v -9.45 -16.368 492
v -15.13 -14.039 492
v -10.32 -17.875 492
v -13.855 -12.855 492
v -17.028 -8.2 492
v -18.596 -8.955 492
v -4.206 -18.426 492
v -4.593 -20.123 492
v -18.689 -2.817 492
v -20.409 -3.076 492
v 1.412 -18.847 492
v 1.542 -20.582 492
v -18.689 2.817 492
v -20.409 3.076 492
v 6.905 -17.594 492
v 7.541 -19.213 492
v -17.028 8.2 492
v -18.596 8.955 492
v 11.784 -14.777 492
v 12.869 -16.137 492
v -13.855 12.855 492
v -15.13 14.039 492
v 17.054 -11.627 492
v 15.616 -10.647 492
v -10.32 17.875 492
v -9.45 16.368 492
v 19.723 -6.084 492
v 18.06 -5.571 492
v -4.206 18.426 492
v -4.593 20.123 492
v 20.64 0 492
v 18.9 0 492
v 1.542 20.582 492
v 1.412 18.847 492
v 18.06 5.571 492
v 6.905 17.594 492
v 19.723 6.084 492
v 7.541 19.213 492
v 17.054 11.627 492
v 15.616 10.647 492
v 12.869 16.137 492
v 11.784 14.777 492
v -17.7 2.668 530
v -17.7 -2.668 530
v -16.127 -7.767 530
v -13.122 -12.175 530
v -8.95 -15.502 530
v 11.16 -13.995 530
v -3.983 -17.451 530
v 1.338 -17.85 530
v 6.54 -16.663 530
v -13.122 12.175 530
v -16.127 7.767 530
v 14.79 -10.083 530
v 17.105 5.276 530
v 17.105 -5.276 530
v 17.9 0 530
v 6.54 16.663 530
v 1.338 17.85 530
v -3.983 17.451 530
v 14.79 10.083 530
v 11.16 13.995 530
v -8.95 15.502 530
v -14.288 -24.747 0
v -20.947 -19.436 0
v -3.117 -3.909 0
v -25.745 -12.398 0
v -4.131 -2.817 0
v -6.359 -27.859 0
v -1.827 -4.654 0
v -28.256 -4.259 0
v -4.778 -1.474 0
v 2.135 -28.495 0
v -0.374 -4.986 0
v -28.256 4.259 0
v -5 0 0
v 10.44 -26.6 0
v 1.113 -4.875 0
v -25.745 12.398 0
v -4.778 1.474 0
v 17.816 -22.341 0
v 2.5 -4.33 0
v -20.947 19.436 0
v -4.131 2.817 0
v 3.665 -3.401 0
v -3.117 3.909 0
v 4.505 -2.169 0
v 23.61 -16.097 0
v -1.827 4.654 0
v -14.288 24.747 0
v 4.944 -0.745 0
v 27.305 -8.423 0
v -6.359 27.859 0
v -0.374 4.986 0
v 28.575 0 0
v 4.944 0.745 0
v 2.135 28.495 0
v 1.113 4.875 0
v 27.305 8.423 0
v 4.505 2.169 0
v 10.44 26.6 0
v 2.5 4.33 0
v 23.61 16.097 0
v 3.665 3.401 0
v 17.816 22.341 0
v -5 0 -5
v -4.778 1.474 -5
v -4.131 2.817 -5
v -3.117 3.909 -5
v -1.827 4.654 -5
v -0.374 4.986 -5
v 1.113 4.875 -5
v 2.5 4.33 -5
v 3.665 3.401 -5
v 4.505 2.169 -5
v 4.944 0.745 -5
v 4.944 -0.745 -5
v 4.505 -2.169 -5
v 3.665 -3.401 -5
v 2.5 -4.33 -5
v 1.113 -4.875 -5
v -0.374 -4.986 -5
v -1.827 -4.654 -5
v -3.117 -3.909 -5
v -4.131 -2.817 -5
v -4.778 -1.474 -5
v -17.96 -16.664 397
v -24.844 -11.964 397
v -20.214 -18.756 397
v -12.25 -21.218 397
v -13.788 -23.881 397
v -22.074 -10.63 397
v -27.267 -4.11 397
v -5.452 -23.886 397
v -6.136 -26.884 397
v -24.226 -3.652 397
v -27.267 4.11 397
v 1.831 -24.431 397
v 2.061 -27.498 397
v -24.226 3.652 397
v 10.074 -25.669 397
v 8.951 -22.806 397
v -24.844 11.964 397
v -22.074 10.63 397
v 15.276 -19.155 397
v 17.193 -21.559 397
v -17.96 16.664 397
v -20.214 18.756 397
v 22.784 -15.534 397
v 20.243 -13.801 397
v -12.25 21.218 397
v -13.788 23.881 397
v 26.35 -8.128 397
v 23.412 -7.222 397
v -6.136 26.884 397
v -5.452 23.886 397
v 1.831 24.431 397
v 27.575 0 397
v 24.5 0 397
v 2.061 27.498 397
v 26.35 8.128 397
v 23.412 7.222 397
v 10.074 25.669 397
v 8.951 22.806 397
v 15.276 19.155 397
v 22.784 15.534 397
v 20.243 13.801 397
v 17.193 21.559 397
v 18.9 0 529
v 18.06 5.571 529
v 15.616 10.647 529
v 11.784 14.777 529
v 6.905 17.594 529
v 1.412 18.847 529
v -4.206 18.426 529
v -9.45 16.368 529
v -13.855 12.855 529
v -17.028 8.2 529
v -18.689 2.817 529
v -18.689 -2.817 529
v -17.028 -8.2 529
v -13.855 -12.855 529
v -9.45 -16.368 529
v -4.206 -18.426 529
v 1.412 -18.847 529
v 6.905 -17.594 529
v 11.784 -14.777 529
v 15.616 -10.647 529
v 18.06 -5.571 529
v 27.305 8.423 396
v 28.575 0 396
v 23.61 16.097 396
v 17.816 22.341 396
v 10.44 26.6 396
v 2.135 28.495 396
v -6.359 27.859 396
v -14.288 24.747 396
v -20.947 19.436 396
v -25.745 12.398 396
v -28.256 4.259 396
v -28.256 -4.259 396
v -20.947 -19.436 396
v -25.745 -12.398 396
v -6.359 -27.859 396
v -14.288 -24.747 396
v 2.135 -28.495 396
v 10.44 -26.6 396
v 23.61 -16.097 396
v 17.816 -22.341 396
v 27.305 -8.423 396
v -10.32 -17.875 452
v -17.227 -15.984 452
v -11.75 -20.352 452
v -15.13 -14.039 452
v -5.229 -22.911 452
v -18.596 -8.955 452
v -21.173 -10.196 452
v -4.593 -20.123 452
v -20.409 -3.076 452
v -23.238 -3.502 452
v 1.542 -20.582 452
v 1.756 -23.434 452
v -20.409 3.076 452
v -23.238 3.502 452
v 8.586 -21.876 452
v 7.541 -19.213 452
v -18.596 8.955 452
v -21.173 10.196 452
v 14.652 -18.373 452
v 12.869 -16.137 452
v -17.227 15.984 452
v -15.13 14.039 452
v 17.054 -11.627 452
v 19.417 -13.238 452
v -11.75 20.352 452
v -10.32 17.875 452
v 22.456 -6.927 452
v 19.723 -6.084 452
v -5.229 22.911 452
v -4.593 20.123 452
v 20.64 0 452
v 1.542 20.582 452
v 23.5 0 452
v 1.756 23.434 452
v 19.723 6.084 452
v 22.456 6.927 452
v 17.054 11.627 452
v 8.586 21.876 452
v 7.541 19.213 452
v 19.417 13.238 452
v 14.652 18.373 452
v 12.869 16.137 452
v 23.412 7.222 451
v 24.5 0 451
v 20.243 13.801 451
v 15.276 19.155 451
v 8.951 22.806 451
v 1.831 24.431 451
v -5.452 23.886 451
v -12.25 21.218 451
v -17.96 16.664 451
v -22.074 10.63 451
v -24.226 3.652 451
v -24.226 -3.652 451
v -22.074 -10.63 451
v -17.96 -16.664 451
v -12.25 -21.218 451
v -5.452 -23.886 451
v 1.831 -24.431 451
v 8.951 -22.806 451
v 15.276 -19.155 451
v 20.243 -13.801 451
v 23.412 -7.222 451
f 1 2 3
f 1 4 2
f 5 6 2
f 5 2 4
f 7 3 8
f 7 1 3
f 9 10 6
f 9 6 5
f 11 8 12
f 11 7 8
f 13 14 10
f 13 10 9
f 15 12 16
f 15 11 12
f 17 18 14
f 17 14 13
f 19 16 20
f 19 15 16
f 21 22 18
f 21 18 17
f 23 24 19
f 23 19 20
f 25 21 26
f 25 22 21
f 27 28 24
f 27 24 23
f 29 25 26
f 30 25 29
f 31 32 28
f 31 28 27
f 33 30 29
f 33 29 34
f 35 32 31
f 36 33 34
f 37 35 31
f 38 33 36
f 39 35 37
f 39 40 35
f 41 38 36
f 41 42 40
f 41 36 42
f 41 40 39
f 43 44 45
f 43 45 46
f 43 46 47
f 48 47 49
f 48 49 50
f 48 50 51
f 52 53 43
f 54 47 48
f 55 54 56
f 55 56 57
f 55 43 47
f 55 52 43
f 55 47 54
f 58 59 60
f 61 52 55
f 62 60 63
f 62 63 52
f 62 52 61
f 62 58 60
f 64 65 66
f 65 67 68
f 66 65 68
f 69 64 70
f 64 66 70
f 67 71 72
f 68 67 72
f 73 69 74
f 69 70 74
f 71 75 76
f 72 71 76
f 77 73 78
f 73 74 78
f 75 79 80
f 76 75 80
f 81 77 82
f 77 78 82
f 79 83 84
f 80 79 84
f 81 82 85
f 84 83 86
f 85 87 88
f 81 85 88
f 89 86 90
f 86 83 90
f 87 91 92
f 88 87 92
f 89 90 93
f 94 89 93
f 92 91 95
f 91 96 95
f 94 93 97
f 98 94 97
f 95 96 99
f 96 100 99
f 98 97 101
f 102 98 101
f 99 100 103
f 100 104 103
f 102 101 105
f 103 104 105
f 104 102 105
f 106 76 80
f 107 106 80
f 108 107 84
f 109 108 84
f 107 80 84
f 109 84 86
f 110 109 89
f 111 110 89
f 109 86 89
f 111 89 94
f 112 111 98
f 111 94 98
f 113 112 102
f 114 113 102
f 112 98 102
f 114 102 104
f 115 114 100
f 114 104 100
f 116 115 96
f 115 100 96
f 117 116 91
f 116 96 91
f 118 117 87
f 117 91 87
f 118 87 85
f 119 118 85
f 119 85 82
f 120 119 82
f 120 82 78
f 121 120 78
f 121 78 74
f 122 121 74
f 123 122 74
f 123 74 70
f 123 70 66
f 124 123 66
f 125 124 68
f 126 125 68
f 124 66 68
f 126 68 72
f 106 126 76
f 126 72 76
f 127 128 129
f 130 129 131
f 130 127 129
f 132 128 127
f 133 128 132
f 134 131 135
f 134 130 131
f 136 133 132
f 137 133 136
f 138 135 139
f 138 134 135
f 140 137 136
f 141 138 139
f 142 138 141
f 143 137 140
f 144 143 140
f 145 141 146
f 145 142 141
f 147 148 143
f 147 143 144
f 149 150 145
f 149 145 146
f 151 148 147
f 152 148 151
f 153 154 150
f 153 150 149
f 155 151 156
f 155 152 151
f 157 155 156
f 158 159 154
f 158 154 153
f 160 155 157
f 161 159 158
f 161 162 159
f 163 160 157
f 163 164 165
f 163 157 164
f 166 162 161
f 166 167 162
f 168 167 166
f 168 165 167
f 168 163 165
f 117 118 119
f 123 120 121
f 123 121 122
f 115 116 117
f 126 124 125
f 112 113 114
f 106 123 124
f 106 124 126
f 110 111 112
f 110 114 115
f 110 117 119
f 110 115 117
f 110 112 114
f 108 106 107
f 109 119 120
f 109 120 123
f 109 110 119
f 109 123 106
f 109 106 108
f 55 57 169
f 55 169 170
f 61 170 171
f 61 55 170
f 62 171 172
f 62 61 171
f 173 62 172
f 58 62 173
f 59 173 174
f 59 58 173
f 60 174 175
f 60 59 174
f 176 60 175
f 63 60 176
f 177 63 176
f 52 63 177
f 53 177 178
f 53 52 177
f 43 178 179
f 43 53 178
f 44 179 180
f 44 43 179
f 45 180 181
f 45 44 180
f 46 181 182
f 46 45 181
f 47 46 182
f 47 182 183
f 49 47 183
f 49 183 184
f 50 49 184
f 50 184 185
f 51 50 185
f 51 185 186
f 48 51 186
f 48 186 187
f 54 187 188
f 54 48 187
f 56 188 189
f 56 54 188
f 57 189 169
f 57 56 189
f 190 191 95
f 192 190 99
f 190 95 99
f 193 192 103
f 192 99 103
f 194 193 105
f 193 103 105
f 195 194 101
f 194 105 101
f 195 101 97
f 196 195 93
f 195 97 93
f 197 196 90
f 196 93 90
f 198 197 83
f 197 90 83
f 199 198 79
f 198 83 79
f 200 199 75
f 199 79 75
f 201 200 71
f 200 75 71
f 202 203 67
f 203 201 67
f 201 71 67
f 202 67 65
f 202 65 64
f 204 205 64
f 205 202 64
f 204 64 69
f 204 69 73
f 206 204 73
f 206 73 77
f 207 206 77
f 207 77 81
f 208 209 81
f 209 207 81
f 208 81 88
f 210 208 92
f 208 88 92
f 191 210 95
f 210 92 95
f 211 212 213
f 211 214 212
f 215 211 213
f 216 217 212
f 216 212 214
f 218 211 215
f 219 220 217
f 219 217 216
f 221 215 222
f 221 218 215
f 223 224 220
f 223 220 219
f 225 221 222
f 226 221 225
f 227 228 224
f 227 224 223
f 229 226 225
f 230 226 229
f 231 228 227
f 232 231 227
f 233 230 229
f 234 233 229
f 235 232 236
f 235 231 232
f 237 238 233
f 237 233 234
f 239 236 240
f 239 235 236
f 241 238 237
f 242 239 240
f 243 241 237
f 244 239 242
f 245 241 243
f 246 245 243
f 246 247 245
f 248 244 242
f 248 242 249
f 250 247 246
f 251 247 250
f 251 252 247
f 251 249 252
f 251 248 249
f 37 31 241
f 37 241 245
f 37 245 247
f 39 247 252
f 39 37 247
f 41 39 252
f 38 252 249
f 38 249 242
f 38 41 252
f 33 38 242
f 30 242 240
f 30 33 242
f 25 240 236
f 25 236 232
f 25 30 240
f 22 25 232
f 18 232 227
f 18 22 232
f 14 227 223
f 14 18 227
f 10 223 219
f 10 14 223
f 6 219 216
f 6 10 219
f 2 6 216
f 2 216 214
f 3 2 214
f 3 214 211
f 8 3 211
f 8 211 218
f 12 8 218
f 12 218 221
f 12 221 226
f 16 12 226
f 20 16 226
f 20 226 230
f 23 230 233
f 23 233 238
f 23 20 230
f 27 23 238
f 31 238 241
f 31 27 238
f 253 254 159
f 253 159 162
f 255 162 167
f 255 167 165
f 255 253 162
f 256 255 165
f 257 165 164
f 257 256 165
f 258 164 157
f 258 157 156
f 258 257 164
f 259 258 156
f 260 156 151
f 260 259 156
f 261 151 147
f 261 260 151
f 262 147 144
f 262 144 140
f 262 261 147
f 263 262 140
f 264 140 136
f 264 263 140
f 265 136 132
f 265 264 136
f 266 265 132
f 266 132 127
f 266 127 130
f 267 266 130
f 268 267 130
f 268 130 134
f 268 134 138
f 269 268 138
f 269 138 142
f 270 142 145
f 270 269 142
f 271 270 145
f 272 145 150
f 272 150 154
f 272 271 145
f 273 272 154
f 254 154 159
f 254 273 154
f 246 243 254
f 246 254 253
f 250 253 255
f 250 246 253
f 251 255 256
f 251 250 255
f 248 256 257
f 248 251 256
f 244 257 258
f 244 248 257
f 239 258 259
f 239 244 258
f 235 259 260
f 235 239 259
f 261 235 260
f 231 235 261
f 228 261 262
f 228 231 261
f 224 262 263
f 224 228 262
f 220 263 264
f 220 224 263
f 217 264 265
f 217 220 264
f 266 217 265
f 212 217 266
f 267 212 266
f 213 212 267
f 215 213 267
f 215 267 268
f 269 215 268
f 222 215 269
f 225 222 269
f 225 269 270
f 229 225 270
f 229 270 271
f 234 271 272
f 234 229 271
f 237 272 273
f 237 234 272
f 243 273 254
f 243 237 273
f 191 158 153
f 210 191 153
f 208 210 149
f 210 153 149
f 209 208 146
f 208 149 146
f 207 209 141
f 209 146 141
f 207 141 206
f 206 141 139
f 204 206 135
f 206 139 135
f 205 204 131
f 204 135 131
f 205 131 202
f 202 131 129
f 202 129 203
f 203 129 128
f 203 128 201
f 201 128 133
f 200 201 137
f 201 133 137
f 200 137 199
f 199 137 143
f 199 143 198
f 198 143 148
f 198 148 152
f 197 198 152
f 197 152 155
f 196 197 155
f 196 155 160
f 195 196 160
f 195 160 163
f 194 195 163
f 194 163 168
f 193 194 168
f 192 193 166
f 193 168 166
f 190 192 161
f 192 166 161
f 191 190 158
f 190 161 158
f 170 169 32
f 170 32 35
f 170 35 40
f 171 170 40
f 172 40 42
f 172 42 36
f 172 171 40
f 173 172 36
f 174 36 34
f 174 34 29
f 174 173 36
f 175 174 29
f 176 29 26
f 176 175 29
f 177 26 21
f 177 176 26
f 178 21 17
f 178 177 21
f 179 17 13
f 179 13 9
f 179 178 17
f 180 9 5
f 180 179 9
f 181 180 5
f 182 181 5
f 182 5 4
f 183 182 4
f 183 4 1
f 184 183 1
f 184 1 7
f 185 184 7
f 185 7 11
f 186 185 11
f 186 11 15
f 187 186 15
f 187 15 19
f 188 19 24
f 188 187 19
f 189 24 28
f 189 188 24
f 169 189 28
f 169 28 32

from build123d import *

# Parameters (mm, degrees)
SKETCH1_R           = 28.575
BOSS_EXTRUDE1_DEPTH = 530
SKETCH2_OUTSIDE_W   = 166.376
SKETCH2_OUTSIDE_H   = 166.376
SKETCH2_OUTSIDE_R   = 18.9
CUT_EXTRUDE1_DEPTH  = 38
SKETCH3_OUTSIDE_W   = 166.376
SKETCH3_OUTSIDE_H   = 166.376
SKETCH3_OUTSIDE_R   = 20.64
CUT_EXTRUDE2_DEPTH  = 40
SKETCH4_OUTSIDE_W   = 166.376
SKETCH4_OUTSIDE_H   = 166.376
SKETCH4_OUTSIDE_R   = 24.5
CUT_EXTRUDE3_DEPTH  = 55
SKETCH5_R           = 5
BOSS_EXTRUDE2_DEPTH = 5
CHAMFER1_SIZE       = 1


with BuildPart() as part:
    # Sketch1 → Boss-Extrude1 (new body)
    with BuildSketch(Plane.XY):
        Circle(SKETCH1_R)
    extrude(amount=BOSS_EXTRUDE1_DEPTH)

    # Sketch2 outside → Cut-Extrude1 (cut)
    with BuildSketch(Plane.XY.offset(530)):
        Rectangle(SKETCH2_OUTSIDE_W, SKETCH2_OUTSIDE_H)
        Circle(SKETCH2_OUTSIDE_R, mode=Mode.SUBTRACT)
    extrude(amount=-CUT_EXTRUDE1_DEPTH, mode=Mode.SUBTRACT)

    # Sketch3 outside → Cut-Extrude2 (cut)
    with BuildSketch(Plane.XY.offset(492)):
        Rectangle(SKETCH3_OUTSIDE_W, SKETCH3_OUTSIDE_H)
        Circle(SKETCH3_OUTSIDE_R, mode=Mode.SUBTRACT)
    extrude(amount=-CUT_EXTRUDE2_DEPTH, mode=Mode.SUBTRACT)

    # Sketch4 outside → Cut-Extrude3 (cut)
    with BuildSketch(Plane.XY.offset(452)):
        Rectangle(SKETCH4_OUTSIDE_W, SKETCH4_OUTSIDE_H)
        Circle(SKETCH4_OUTSIDE_R, mode=Mode.SUBTRACT)
    extrude(amount=-CUT_EXTRUDE3_DEPTH, mode=Mode.SUBTRACT)

    # Sketch5 → Boss-Extrude2 (add)
    with BuildSketch(Plane(origin=(0, 0, 0), x_dir=(-1, 0, 0), z_dir=(0, 0, -1))):
        Circle(SKETCH5_R)
    extrude(amount=BOSS_EXTRUDE2_DEPTH)

    # Chamfer1
    chamfer1_edges = [part.edges().sort_by_distance(p)[0] for p in [
        (-18.9, 0, 530),
        (-28.575, 0, 397),
        (-24.5, 0, 452),
    ]]
    chamfer(chamfer1_edges, length=CHAMFER1_SIZE)


solid = part.part
